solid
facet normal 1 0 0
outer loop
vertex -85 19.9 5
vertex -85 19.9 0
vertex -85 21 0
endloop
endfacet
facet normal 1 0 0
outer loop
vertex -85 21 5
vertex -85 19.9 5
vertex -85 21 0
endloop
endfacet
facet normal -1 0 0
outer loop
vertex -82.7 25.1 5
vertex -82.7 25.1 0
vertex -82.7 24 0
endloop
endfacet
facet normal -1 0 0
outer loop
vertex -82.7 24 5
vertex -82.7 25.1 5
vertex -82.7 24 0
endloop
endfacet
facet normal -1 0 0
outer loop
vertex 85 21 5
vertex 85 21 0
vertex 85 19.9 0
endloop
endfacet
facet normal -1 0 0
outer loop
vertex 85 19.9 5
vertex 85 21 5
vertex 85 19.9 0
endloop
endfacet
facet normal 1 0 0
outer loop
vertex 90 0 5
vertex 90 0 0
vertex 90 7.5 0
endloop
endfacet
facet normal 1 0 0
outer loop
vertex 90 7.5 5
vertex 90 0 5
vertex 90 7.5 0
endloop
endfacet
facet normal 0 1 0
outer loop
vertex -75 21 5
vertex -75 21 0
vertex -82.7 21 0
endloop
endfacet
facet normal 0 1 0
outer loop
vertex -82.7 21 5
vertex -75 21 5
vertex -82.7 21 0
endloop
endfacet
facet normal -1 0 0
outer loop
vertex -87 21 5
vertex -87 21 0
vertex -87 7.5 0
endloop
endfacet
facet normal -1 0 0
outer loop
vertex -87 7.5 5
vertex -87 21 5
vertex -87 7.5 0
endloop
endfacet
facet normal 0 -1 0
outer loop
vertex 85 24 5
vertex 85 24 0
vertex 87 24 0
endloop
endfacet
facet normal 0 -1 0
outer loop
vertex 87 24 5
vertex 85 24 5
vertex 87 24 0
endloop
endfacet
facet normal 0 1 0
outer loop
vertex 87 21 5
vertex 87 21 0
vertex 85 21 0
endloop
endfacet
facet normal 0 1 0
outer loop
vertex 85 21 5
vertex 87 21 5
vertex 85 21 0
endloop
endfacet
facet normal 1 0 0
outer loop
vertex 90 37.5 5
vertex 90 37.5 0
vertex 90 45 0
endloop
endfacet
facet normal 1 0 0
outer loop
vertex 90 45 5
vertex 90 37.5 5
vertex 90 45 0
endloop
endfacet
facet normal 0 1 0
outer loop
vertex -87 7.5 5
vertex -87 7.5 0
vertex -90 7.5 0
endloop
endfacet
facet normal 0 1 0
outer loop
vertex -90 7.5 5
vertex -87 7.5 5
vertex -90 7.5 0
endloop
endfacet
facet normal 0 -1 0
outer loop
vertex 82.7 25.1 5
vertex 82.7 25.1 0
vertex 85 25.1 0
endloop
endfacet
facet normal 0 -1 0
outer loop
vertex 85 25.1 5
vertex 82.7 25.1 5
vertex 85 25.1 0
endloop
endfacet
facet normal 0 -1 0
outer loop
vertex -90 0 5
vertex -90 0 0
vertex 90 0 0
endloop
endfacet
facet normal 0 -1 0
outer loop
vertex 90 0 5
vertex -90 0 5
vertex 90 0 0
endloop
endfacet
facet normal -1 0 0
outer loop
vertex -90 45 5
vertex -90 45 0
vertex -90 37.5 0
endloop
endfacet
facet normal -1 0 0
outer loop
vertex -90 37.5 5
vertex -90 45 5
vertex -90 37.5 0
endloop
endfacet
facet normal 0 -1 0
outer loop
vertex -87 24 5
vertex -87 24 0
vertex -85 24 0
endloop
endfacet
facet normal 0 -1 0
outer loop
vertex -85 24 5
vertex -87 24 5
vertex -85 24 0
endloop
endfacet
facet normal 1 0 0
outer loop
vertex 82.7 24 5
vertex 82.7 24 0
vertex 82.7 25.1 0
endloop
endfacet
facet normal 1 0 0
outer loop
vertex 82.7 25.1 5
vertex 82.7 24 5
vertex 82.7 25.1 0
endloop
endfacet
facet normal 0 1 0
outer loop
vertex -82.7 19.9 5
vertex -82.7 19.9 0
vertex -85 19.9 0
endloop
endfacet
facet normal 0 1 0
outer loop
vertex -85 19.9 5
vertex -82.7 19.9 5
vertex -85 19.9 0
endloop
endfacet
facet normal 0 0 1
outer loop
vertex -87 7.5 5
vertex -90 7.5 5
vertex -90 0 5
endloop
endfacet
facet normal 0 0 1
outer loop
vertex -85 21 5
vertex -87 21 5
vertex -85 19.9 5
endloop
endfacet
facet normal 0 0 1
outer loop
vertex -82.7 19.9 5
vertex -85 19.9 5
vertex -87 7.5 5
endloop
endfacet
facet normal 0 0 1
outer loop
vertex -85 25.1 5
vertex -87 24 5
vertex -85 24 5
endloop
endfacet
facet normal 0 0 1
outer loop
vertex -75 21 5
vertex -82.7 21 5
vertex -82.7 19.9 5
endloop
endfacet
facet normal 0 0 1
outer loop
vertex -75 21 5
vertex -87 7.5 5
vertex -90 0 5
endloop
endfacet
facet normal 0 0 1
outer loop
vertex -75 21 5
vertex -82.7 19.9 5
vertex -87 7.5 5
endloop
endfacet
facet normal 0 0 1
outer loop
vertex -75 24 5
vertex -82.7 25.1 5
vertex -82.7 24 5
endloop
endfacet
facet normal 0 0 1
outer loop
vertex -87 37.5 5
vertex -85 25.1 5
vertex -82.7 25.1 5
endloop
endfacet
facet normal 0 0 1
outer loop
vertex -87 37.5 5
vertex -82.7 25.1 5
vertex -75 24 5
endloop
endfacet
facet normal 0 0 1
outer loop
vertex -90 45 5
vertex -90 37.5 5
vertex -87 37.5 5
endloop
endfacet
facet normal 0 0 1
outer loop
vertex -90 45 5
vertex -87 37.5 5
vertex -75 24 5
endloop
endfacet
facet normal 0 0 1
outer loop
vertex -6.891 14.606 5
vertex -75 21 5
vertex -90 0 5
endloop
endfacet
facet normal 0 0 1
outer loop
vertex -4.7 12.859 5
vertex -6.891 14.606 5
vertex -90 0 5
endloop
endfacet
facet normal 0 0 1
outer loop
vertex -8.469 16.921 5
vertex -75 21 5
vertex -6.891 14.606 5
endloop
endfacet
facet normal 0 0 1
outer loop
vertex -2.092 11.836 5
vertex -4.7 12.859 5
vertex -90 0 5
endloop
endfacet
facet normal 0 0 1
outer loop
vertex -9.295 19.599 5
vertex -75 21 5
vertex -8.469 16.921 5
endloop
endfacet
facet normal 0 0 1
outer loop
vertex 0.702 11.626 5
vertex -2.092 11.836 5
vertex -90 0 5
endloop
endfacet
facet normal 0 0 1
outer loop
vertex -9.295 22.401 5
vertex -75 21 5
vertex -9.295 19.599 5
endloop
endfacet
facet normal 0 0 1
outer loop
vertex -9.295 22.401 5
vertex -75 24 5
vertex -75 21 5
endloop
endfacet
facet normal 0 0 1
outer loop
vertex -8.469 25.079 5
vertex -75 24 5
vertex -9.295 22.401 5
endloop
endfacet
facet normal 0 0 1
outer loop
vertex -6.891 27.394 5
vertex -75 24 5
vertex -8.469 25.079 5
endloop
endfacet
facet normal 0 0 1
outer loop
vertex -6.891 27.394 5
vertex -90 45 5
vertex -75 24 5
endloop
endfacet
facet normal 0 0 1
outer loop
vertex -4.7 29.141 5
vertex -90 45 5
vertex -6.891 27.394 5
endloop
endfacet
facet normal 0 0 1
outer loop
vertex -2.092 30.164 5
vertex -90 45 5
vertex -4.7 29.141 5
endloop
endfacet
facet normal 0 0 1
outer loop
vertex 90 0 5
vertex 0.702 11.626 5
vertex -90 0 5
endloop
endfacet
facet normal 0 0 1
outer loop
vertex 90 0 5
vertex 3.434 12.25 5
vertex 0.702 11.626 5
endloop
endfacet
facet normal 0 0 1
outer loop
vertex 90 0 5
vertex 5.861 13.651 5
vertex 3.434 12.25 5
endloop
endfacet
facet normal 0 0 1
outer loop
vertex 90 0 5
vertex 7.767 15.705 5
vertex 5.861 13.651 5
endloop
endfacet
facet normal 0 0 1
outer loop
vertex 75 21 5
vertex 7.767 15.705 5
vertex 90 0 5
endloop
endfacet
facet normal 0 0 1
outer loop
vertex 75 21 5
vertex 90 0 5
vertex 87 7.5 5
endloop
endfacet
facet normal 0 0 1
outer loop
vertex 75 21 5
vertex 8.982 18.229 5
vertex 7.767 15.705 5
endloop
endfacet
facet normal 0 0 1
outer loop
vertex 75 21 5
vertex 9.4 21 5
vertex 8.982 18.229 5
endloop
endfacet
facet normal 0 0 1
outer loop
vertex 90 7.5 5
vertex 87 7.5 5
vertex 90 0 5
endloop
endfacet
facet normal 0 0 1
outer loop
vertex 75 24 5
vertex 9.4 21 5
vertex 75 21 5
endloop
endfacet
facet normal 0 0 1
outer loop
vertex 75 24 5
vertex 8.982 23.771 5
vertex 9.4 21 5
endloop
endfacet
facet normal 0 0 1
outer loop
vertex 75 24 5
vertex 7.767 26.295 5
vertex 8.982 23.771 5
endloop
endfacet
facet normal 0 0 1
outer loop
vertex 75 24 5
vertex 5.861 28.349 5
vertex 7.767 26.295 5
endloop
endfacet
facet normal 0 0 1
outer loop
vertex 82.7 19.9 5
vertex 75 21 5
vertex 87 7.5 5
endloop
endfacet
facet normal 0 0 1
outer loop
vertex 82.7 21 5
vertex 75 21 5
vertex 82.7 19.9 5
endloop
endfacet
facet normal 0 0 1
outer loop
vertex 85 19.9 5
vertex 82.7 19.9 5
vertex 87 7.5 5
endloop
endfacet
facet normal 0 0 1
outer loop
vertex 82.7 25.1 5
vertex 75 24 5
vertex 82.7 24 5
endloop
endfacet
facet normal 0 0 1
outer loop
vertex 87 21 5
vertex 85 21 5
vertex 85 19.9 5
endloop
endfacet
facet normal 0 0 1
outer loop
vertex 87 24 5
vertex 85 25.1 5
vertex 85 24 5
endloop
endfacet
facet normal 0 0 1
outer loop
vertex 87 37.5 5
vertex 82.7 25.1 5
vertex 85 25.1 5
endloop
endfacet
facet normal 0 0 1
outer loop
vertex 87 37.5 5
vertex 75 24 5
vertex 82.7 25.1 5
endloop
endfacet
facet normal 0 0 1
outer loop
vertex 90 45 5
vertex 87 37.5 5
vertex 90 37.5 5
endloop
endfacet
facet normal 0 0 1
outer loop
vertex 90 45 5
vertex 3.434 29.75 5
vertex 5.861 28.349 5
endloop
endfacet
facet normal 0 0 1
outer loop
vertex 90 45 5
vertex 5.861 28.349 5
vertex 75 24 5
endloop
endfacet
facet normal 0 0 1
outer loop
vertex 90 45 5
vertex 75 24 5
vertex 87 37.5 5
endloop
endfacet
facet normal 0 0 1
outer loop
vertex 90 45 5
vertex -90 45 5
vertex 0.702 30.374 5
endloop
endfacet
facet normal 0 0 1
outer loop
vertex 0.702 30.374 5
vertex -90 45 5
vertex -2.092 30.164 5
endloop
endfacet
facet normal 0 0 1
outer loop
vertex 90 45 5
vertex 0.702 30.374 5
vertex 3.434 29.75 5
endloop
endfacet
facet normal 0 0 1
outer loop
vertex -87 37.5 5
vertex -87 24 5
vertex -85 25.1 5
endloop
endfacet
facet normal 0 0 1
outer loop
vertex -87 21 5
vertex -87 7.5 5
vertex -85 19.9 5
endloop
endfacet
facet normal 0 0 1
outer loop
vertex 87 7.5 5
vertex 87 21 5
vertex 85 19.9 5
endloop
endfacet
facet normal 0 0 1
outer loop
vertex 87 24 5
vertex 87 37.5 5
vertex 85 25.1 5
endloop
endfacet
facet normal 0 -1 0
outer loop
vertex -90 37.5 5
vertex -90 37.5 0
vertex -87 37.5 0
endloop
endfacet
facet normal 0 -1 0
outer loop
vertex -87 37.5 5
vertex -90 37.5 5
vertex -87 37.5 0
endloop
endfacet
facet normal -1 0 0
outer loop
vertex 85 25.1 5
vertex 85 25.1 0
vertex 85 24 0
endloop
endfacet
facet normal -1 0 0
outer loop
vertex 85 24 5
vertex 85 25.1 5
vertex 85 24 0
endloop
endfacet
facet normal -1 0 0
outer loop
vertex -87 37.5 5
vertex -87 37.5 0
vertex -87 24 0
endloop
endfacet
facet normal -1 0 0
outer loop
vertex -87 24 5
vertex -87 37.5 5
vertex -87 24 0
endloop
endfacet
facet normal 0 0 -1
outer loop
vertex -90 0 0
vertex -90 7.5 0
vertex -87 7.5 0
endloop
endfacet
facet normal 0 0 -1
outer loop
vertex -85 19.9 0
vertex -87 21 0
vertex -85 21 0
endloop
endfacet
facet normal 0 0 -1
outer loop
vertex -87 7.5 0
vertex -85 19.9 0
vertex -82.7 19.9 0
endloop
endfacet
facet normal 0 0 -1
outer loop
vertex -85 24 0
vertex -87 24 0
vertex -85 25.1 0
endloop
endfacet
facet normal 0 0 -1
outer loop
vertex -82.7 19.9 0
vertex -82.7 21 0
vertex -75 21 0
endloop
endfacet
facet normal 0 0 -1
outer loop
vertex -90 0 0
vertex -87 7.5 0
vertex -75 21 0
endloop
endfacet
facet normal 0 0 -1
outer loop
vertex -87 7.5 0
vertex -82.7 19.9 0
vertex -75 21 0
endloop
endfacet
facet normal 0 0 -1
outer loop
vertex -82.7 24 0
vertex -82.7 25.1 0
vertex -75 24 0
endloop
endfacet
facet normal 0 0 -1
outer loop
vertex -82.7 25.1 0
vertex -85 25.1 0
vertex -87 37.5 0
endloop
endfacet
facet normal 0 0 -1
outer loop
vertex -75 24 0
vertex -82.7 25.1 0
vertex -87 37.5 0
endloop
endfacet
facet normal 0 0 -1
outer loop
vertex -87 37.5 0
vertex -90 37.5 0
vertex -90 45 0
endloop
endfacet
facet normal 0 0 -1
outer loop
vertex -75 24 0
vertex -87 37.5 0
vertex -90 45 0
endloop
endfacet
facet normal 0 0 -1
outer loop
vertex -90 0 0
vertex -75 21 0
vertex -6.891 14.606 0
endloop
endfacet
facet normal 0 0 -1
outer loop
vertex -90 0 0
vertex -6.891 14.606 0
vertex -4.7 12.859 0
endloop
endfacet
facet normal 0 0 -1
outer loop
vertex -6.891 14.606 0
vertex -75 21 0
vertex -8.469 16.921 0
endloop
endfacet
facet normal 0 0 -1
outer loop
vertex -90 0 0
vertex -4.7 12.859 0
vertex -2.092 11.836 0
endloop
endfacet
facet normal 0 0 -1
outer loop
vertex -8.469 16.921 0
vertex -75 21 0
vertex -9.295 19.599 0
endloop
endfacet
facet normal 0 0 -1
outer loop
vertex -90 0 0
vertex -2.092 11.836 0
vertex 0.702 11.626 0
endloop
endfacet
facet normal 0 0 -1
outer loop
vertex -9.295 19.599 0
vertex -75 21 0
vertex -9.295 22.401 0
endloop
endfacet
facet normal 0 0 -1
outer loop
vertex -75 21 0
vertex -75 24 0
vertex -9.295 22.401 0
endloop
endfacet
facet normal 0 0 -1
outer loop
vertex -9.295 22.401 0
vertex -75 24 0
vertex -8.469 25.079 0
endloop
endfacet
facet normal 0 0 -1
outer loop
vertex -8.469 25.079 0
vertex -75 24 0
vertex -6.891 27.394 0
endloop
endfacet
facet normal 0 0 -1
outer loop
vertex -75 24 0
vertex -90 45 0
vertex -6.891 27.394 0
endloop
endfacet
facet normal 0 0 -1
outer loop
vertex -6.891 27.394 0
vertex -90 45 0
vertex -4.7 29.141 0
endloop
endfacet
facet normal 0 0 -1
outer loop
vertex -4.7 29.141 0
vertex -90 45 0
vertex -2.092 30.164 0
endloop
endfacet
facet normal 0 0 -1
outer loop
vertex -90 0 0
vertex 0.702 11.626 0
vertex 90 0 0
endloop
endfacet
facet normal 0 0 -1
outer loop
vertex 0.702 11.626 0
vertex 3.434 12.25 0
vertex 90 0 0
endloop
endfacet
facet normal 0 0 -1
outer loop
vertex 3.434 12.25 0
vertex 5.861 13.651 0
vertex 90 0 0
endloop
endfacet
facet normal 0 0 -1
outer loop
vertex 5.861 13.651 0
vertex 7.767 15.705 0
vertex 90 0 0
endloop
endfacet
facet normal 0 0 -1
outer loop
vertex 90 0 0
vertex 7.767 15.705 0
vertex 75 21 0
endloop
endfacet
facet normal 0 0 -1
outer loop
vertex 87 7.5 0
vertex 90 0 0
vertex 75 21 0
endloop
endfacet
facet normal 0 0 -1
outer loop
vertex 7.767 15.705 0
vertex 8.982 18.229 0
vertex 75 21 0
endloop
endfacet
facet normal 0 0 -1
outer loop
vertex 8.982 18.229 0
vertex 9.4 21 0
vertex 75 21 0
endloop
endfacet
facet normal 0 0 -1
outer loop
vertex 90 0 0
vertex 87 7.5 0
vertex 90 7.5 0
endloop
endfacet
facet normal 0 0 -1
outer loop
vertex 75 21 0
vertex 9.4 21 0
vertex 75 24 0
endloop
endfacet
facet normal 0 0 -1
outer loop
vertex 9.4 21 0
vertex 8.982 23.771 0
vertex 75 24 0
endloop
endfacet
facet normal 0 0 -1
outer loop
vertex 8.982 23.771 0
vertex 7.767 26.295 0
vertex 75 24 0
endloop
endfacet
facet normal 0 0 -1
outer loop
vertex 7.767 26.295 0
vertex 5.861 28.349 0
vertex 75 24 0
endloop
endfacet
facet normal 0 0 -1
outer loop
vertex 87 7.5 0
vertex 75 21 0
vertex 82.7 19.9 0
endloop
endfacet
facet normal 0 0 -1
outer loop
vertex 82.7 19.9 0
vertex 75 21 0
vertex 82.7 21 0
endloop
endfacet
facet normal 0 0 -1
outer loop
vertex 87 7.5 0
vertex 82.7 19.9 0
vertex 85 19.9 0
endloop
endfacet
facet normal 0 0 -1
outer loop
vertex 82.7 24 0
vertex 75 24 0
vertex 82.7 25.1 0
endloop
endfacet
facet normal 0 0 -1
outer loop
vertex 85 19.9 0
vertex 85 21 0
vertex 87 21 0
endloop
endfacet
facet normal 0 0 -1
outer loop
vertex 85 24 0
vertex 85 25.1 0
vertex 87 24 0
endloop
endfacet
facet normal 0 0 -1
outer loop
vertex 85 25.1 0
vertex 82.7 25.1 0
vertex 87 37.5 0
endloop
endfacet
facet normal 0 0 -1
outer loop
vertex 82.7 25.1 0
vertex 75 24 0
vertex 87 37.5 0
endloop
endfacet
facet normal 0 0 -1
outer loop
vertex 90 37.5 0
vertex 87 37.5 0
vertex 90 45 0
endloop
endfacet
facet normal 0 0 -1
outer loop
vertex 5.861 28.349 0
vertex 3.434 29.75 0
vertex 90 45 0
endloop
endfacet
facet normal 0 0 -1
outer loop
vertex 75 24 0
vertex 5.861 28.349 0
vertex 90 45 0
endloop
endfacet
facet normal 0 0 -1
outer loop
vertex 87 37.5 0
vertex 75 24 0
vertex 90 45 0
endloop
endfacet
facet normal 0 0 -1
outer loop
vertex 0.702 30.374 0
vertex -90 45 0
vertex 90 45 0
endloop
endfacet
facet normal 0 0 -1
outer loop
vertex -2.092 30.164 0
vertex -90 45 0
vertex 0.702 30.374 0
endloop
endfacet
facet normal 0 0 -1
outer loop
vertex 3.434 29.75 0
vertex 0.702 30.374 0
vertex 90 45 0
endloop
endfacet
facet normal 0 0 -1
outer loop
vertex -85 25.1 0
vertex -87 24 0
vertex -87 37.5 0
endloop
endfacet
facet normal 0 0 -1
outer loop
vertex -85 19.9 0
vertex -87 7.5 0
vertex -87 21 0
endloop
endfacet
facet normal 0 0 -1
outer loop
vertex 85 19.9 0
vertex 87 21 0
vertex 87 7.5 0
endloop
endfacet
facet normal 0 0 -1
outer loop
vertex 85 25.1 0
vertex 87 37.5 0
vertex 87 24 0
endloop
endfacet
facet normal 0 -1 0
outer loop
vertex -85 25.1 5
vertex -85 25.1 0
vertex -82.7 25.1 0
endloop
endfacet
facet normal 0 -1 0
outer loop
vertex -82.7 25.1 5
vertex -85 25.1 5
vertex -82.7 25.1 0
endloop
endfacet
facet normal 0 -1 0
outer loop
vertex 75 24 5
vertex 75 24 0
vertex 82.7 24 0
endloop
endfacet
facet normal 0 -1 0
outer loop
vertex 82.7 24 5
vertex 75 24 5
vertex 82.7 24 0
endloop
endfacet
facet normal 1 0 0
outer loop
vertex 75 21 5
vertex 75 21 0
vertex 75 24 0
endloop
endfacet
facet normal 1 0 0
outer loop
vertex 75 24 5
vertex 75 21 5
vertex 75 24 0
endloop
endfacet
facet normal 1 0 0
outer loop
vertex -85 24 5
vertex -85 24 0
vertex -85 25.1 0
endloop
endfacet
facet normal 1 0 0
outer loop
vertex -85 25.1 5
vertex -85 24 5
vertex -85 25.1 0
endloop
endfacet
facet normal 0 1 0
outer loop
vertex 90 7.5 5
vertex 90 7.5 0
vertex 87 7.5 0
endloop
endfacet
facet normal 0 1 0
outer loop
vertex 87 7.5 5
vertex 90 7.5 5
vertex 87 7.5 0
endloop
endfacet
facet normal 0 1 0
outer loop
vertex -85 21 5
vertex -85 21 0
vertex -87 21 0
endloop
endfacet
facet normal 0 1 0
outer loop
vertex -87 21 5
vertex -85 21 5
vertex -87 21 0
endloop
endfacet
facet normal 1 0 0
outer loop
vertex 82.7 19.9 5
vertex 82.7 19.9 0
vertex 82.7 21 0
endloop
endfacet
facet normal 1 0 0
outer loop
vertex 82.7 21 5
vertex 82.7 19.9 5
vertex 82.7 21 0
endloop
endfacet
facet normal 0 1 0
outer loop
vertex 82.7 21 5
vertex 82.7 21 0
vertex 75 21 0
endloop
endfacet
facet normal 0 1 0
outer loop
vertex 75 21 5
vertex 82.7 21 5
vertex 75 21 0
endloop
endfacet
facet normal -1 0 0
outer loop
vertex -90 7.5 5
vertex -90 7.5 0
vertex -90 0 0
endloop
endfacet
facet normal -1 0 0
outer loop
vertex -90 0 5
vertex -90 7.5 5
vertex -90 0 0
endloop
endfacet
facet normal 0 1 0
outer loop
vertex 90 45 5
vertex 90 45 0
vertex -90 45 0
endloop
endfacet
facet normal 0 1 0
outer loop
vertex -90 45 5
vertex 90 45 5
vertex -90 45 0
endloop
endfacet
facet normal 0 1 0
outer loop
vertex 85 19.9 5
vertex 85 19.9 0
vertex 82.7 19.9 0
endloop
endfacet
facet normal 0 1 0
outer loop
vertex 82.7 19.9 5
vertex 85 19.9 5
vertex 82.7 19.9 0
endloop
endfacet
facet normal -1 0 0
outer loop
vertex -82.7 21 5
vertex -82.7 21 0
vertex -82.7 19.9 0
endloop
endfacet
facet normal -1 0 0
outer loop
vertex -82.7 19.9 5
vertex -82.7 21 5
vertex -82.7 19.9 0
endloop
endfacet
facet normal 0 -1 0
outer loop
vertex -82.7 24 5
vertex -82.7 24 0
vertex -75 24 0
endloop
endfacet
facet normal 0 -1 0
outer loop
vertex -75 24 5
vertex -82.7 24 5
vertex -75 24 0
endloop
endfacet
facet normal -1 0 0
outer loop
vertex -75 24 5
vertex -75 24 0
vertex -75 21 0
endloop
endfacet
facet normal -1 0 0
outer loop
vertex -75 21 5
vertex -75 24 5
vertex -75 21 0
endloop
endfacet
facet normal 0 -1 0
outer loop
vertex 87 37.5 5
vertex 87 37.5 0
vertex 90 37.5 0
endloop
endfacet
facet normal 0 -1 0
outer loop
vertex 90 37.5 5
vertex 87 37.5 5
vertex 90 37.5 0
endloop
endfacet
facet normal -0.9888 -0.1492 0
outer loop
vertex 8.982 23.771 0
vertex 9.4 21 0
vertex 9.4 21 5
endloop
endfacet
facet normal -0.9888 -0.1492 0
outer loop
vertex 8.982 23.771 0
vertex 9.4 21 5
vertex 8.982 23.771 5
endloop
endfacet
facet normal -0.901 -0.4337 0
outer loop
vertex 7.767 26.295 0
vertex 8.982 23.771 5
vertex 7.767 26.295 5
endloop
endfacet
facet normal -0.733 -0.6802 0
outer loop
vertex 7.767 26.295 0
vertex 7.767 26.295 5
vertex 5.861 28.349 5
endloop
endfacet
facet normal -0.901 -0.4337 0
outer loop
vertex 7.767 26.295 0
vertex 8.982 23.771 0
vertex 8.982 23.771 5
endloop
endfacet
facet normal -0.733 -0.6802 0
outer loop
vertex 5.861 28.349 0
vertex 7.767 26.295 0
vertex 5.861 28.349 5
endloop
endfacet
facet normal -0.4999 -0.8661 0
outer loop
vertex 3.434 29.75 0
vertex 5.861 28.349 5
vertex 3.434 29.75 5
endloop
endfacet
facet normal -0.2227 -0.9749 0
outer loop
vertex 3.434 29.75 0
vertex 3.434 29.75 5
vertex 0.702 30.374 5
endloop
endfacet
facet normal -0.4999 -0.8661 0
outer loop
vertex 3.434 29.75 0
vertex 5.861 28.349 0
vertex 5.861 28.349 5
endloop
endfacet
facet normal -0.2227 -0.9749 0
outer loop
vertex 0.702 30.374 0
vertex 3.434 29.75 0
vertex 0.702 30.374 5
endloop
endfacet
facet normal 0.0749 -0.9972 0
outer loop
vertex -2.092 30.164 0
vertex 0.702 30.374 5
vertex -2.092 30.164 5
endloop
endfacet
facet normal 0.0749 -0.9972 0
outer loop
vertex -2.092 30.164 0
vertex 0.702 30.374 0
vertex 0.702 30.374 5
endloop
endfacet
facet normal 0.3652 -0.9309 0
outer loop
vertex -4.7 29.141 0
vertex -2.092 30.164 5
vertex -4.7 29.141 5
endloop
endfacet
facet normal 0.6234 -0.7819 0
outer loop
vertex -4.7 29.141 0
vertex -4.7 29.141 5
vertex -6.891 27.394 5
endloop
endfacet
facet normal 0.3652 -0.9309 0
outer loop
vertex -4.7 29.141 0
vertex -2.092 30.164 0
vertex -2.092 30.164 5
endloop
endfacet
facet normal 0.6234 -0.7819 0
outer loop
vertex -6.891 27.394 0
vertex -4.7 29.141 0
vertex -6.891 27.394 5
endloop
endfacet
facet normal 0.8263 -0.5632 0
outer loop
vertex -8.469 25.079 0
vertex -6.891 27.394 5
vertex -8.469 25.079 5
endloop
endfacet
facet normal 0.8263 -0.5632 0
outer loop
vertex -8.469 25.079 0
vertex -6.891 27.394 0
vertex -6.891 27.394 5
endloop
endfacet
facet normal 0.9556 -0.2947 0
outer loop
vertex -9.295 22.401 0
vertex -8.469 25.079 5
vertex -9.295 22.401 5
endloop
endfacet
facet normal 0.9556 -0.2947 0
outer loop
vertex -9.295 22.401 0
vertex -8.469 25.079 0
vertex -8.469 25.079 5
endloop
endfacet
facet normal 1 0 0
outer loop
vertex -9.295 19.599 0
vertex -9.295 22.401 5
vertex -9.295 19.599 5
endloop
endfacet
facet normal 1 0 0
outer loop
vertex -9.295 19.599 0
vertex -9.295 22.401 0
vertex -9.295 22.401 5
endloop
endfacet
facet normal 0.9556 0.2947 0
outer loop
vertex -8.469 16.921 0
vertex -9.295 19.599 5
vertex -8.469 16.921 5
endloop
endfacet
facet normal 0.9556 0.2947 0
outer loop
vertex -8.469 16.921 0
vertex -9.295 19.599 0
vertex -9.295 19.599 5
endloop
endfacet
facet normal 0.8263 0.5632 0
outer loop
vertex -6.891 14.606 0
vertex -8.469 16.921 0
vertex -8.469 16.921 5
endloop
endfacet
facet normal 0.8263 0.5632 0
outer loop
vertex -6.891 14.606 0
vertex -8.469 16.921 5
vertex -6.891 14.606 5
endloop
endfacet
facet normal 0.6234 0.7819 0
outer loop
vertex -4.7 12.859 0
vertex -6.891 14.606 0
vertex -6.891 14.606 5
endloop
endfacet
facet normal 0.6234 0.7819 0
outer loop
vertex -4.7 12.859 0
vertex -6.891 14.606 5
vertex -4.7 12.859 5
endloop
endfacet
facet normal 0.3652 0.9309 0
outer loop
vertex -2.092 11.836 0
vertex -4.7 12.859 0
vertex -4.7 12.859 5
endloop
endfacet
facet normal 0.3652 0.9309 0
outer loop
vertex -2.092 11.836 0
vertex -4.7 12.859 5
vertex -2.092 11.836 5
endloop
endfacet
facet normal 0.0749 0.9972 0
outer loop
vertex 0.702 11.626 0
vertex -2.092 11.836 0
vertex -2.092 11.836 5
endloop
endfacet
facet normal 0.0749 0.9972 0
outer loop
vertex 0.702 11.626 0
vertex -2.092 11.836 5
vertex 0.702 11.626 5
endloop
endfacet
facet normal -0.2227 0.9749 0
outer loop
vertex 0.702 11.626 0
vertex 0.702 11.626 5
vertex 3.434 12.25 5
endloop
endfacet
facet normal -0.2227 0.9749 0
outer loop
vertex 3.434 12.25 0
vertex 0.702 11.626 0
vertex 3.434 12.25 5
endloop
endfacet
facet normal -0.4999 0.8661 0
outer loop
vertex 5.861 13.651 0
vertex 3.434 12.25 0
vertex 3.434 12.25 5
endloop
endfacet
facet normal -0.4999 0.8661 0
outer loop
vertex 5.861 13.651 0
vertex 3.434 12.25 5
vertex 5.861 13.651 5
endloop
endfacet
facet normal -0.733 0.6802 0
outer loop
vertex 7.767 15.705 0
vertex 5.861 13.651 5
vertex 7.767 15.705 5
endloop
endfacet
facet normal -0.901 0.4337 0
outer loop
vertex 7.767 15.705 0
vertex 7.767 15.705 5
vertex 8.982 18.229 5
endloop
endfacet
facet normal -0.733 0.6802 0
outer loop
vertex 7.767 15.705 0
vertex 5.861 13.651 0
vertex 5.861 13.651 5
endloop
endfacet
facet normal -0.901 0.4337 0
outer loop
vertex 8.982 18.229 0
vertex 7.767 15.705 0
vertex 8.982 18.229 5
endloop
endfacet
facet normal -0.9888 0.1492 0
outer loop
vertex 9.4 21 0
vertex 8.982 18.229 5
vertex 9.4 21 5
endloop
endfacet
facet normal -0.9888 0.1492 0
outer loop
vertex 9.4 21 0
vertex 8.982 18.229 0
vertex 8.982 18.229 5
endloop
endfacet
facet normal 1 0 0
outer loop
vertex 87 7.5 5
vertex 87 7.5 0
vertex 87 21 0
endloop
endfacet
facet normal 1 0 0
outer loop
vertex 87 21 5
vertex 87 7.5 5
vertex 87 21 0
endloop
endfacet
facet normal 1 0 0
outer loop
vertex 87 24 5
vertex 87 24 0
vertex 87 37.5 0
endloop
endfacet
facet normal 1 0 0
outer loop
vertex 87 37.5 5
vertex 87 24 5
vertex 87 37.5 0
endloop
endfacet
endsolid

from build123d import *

# Parameters (mm, degrees)
ESQUISSE1_R        = 9.4
BOSS_EXTRU_1_DEPTH = 5


with BuildPart() as part:
    # Esquisse1 → Boss.-Extru.1 (new body)
    with BuildSketch(Plane.XY):
        Polygon((90, 45), (34.5, 45), (-34.5, 45), (-90, 45), (-90, 37.5), (-87, 37.5), (-87, 24), (-85, 24), (-85, 25.1), (-82.7, 25.1), (-82.7, 24), (-75, 24), (-75, 21), (-82.7, 21), (-82.7, 19.9), (-85, 19.9), (-85, 21), (-87, 21), (-87, 7.5), (-90, 7.5), (-90, 0), (90, 0), (90, 7.5), (87, 7.5), (87, 21), (85, 21), (85, 19.9), (82.7, 19.9), (82.7, 21), (75, 21), (75, 24), (82.7, 24), (82.7, 25.1), (85, 25.1), (85, 24), (87, 24), (87, 37.5), (90, 37.5), align=None)
        with Locations((0, 21)):
            Circle(ESQUISSE1_R, mode=Mode.SUBTRACT)
    extrude(amount=BOSS_EXTRU_1_DEPTH)


solid = part.part
